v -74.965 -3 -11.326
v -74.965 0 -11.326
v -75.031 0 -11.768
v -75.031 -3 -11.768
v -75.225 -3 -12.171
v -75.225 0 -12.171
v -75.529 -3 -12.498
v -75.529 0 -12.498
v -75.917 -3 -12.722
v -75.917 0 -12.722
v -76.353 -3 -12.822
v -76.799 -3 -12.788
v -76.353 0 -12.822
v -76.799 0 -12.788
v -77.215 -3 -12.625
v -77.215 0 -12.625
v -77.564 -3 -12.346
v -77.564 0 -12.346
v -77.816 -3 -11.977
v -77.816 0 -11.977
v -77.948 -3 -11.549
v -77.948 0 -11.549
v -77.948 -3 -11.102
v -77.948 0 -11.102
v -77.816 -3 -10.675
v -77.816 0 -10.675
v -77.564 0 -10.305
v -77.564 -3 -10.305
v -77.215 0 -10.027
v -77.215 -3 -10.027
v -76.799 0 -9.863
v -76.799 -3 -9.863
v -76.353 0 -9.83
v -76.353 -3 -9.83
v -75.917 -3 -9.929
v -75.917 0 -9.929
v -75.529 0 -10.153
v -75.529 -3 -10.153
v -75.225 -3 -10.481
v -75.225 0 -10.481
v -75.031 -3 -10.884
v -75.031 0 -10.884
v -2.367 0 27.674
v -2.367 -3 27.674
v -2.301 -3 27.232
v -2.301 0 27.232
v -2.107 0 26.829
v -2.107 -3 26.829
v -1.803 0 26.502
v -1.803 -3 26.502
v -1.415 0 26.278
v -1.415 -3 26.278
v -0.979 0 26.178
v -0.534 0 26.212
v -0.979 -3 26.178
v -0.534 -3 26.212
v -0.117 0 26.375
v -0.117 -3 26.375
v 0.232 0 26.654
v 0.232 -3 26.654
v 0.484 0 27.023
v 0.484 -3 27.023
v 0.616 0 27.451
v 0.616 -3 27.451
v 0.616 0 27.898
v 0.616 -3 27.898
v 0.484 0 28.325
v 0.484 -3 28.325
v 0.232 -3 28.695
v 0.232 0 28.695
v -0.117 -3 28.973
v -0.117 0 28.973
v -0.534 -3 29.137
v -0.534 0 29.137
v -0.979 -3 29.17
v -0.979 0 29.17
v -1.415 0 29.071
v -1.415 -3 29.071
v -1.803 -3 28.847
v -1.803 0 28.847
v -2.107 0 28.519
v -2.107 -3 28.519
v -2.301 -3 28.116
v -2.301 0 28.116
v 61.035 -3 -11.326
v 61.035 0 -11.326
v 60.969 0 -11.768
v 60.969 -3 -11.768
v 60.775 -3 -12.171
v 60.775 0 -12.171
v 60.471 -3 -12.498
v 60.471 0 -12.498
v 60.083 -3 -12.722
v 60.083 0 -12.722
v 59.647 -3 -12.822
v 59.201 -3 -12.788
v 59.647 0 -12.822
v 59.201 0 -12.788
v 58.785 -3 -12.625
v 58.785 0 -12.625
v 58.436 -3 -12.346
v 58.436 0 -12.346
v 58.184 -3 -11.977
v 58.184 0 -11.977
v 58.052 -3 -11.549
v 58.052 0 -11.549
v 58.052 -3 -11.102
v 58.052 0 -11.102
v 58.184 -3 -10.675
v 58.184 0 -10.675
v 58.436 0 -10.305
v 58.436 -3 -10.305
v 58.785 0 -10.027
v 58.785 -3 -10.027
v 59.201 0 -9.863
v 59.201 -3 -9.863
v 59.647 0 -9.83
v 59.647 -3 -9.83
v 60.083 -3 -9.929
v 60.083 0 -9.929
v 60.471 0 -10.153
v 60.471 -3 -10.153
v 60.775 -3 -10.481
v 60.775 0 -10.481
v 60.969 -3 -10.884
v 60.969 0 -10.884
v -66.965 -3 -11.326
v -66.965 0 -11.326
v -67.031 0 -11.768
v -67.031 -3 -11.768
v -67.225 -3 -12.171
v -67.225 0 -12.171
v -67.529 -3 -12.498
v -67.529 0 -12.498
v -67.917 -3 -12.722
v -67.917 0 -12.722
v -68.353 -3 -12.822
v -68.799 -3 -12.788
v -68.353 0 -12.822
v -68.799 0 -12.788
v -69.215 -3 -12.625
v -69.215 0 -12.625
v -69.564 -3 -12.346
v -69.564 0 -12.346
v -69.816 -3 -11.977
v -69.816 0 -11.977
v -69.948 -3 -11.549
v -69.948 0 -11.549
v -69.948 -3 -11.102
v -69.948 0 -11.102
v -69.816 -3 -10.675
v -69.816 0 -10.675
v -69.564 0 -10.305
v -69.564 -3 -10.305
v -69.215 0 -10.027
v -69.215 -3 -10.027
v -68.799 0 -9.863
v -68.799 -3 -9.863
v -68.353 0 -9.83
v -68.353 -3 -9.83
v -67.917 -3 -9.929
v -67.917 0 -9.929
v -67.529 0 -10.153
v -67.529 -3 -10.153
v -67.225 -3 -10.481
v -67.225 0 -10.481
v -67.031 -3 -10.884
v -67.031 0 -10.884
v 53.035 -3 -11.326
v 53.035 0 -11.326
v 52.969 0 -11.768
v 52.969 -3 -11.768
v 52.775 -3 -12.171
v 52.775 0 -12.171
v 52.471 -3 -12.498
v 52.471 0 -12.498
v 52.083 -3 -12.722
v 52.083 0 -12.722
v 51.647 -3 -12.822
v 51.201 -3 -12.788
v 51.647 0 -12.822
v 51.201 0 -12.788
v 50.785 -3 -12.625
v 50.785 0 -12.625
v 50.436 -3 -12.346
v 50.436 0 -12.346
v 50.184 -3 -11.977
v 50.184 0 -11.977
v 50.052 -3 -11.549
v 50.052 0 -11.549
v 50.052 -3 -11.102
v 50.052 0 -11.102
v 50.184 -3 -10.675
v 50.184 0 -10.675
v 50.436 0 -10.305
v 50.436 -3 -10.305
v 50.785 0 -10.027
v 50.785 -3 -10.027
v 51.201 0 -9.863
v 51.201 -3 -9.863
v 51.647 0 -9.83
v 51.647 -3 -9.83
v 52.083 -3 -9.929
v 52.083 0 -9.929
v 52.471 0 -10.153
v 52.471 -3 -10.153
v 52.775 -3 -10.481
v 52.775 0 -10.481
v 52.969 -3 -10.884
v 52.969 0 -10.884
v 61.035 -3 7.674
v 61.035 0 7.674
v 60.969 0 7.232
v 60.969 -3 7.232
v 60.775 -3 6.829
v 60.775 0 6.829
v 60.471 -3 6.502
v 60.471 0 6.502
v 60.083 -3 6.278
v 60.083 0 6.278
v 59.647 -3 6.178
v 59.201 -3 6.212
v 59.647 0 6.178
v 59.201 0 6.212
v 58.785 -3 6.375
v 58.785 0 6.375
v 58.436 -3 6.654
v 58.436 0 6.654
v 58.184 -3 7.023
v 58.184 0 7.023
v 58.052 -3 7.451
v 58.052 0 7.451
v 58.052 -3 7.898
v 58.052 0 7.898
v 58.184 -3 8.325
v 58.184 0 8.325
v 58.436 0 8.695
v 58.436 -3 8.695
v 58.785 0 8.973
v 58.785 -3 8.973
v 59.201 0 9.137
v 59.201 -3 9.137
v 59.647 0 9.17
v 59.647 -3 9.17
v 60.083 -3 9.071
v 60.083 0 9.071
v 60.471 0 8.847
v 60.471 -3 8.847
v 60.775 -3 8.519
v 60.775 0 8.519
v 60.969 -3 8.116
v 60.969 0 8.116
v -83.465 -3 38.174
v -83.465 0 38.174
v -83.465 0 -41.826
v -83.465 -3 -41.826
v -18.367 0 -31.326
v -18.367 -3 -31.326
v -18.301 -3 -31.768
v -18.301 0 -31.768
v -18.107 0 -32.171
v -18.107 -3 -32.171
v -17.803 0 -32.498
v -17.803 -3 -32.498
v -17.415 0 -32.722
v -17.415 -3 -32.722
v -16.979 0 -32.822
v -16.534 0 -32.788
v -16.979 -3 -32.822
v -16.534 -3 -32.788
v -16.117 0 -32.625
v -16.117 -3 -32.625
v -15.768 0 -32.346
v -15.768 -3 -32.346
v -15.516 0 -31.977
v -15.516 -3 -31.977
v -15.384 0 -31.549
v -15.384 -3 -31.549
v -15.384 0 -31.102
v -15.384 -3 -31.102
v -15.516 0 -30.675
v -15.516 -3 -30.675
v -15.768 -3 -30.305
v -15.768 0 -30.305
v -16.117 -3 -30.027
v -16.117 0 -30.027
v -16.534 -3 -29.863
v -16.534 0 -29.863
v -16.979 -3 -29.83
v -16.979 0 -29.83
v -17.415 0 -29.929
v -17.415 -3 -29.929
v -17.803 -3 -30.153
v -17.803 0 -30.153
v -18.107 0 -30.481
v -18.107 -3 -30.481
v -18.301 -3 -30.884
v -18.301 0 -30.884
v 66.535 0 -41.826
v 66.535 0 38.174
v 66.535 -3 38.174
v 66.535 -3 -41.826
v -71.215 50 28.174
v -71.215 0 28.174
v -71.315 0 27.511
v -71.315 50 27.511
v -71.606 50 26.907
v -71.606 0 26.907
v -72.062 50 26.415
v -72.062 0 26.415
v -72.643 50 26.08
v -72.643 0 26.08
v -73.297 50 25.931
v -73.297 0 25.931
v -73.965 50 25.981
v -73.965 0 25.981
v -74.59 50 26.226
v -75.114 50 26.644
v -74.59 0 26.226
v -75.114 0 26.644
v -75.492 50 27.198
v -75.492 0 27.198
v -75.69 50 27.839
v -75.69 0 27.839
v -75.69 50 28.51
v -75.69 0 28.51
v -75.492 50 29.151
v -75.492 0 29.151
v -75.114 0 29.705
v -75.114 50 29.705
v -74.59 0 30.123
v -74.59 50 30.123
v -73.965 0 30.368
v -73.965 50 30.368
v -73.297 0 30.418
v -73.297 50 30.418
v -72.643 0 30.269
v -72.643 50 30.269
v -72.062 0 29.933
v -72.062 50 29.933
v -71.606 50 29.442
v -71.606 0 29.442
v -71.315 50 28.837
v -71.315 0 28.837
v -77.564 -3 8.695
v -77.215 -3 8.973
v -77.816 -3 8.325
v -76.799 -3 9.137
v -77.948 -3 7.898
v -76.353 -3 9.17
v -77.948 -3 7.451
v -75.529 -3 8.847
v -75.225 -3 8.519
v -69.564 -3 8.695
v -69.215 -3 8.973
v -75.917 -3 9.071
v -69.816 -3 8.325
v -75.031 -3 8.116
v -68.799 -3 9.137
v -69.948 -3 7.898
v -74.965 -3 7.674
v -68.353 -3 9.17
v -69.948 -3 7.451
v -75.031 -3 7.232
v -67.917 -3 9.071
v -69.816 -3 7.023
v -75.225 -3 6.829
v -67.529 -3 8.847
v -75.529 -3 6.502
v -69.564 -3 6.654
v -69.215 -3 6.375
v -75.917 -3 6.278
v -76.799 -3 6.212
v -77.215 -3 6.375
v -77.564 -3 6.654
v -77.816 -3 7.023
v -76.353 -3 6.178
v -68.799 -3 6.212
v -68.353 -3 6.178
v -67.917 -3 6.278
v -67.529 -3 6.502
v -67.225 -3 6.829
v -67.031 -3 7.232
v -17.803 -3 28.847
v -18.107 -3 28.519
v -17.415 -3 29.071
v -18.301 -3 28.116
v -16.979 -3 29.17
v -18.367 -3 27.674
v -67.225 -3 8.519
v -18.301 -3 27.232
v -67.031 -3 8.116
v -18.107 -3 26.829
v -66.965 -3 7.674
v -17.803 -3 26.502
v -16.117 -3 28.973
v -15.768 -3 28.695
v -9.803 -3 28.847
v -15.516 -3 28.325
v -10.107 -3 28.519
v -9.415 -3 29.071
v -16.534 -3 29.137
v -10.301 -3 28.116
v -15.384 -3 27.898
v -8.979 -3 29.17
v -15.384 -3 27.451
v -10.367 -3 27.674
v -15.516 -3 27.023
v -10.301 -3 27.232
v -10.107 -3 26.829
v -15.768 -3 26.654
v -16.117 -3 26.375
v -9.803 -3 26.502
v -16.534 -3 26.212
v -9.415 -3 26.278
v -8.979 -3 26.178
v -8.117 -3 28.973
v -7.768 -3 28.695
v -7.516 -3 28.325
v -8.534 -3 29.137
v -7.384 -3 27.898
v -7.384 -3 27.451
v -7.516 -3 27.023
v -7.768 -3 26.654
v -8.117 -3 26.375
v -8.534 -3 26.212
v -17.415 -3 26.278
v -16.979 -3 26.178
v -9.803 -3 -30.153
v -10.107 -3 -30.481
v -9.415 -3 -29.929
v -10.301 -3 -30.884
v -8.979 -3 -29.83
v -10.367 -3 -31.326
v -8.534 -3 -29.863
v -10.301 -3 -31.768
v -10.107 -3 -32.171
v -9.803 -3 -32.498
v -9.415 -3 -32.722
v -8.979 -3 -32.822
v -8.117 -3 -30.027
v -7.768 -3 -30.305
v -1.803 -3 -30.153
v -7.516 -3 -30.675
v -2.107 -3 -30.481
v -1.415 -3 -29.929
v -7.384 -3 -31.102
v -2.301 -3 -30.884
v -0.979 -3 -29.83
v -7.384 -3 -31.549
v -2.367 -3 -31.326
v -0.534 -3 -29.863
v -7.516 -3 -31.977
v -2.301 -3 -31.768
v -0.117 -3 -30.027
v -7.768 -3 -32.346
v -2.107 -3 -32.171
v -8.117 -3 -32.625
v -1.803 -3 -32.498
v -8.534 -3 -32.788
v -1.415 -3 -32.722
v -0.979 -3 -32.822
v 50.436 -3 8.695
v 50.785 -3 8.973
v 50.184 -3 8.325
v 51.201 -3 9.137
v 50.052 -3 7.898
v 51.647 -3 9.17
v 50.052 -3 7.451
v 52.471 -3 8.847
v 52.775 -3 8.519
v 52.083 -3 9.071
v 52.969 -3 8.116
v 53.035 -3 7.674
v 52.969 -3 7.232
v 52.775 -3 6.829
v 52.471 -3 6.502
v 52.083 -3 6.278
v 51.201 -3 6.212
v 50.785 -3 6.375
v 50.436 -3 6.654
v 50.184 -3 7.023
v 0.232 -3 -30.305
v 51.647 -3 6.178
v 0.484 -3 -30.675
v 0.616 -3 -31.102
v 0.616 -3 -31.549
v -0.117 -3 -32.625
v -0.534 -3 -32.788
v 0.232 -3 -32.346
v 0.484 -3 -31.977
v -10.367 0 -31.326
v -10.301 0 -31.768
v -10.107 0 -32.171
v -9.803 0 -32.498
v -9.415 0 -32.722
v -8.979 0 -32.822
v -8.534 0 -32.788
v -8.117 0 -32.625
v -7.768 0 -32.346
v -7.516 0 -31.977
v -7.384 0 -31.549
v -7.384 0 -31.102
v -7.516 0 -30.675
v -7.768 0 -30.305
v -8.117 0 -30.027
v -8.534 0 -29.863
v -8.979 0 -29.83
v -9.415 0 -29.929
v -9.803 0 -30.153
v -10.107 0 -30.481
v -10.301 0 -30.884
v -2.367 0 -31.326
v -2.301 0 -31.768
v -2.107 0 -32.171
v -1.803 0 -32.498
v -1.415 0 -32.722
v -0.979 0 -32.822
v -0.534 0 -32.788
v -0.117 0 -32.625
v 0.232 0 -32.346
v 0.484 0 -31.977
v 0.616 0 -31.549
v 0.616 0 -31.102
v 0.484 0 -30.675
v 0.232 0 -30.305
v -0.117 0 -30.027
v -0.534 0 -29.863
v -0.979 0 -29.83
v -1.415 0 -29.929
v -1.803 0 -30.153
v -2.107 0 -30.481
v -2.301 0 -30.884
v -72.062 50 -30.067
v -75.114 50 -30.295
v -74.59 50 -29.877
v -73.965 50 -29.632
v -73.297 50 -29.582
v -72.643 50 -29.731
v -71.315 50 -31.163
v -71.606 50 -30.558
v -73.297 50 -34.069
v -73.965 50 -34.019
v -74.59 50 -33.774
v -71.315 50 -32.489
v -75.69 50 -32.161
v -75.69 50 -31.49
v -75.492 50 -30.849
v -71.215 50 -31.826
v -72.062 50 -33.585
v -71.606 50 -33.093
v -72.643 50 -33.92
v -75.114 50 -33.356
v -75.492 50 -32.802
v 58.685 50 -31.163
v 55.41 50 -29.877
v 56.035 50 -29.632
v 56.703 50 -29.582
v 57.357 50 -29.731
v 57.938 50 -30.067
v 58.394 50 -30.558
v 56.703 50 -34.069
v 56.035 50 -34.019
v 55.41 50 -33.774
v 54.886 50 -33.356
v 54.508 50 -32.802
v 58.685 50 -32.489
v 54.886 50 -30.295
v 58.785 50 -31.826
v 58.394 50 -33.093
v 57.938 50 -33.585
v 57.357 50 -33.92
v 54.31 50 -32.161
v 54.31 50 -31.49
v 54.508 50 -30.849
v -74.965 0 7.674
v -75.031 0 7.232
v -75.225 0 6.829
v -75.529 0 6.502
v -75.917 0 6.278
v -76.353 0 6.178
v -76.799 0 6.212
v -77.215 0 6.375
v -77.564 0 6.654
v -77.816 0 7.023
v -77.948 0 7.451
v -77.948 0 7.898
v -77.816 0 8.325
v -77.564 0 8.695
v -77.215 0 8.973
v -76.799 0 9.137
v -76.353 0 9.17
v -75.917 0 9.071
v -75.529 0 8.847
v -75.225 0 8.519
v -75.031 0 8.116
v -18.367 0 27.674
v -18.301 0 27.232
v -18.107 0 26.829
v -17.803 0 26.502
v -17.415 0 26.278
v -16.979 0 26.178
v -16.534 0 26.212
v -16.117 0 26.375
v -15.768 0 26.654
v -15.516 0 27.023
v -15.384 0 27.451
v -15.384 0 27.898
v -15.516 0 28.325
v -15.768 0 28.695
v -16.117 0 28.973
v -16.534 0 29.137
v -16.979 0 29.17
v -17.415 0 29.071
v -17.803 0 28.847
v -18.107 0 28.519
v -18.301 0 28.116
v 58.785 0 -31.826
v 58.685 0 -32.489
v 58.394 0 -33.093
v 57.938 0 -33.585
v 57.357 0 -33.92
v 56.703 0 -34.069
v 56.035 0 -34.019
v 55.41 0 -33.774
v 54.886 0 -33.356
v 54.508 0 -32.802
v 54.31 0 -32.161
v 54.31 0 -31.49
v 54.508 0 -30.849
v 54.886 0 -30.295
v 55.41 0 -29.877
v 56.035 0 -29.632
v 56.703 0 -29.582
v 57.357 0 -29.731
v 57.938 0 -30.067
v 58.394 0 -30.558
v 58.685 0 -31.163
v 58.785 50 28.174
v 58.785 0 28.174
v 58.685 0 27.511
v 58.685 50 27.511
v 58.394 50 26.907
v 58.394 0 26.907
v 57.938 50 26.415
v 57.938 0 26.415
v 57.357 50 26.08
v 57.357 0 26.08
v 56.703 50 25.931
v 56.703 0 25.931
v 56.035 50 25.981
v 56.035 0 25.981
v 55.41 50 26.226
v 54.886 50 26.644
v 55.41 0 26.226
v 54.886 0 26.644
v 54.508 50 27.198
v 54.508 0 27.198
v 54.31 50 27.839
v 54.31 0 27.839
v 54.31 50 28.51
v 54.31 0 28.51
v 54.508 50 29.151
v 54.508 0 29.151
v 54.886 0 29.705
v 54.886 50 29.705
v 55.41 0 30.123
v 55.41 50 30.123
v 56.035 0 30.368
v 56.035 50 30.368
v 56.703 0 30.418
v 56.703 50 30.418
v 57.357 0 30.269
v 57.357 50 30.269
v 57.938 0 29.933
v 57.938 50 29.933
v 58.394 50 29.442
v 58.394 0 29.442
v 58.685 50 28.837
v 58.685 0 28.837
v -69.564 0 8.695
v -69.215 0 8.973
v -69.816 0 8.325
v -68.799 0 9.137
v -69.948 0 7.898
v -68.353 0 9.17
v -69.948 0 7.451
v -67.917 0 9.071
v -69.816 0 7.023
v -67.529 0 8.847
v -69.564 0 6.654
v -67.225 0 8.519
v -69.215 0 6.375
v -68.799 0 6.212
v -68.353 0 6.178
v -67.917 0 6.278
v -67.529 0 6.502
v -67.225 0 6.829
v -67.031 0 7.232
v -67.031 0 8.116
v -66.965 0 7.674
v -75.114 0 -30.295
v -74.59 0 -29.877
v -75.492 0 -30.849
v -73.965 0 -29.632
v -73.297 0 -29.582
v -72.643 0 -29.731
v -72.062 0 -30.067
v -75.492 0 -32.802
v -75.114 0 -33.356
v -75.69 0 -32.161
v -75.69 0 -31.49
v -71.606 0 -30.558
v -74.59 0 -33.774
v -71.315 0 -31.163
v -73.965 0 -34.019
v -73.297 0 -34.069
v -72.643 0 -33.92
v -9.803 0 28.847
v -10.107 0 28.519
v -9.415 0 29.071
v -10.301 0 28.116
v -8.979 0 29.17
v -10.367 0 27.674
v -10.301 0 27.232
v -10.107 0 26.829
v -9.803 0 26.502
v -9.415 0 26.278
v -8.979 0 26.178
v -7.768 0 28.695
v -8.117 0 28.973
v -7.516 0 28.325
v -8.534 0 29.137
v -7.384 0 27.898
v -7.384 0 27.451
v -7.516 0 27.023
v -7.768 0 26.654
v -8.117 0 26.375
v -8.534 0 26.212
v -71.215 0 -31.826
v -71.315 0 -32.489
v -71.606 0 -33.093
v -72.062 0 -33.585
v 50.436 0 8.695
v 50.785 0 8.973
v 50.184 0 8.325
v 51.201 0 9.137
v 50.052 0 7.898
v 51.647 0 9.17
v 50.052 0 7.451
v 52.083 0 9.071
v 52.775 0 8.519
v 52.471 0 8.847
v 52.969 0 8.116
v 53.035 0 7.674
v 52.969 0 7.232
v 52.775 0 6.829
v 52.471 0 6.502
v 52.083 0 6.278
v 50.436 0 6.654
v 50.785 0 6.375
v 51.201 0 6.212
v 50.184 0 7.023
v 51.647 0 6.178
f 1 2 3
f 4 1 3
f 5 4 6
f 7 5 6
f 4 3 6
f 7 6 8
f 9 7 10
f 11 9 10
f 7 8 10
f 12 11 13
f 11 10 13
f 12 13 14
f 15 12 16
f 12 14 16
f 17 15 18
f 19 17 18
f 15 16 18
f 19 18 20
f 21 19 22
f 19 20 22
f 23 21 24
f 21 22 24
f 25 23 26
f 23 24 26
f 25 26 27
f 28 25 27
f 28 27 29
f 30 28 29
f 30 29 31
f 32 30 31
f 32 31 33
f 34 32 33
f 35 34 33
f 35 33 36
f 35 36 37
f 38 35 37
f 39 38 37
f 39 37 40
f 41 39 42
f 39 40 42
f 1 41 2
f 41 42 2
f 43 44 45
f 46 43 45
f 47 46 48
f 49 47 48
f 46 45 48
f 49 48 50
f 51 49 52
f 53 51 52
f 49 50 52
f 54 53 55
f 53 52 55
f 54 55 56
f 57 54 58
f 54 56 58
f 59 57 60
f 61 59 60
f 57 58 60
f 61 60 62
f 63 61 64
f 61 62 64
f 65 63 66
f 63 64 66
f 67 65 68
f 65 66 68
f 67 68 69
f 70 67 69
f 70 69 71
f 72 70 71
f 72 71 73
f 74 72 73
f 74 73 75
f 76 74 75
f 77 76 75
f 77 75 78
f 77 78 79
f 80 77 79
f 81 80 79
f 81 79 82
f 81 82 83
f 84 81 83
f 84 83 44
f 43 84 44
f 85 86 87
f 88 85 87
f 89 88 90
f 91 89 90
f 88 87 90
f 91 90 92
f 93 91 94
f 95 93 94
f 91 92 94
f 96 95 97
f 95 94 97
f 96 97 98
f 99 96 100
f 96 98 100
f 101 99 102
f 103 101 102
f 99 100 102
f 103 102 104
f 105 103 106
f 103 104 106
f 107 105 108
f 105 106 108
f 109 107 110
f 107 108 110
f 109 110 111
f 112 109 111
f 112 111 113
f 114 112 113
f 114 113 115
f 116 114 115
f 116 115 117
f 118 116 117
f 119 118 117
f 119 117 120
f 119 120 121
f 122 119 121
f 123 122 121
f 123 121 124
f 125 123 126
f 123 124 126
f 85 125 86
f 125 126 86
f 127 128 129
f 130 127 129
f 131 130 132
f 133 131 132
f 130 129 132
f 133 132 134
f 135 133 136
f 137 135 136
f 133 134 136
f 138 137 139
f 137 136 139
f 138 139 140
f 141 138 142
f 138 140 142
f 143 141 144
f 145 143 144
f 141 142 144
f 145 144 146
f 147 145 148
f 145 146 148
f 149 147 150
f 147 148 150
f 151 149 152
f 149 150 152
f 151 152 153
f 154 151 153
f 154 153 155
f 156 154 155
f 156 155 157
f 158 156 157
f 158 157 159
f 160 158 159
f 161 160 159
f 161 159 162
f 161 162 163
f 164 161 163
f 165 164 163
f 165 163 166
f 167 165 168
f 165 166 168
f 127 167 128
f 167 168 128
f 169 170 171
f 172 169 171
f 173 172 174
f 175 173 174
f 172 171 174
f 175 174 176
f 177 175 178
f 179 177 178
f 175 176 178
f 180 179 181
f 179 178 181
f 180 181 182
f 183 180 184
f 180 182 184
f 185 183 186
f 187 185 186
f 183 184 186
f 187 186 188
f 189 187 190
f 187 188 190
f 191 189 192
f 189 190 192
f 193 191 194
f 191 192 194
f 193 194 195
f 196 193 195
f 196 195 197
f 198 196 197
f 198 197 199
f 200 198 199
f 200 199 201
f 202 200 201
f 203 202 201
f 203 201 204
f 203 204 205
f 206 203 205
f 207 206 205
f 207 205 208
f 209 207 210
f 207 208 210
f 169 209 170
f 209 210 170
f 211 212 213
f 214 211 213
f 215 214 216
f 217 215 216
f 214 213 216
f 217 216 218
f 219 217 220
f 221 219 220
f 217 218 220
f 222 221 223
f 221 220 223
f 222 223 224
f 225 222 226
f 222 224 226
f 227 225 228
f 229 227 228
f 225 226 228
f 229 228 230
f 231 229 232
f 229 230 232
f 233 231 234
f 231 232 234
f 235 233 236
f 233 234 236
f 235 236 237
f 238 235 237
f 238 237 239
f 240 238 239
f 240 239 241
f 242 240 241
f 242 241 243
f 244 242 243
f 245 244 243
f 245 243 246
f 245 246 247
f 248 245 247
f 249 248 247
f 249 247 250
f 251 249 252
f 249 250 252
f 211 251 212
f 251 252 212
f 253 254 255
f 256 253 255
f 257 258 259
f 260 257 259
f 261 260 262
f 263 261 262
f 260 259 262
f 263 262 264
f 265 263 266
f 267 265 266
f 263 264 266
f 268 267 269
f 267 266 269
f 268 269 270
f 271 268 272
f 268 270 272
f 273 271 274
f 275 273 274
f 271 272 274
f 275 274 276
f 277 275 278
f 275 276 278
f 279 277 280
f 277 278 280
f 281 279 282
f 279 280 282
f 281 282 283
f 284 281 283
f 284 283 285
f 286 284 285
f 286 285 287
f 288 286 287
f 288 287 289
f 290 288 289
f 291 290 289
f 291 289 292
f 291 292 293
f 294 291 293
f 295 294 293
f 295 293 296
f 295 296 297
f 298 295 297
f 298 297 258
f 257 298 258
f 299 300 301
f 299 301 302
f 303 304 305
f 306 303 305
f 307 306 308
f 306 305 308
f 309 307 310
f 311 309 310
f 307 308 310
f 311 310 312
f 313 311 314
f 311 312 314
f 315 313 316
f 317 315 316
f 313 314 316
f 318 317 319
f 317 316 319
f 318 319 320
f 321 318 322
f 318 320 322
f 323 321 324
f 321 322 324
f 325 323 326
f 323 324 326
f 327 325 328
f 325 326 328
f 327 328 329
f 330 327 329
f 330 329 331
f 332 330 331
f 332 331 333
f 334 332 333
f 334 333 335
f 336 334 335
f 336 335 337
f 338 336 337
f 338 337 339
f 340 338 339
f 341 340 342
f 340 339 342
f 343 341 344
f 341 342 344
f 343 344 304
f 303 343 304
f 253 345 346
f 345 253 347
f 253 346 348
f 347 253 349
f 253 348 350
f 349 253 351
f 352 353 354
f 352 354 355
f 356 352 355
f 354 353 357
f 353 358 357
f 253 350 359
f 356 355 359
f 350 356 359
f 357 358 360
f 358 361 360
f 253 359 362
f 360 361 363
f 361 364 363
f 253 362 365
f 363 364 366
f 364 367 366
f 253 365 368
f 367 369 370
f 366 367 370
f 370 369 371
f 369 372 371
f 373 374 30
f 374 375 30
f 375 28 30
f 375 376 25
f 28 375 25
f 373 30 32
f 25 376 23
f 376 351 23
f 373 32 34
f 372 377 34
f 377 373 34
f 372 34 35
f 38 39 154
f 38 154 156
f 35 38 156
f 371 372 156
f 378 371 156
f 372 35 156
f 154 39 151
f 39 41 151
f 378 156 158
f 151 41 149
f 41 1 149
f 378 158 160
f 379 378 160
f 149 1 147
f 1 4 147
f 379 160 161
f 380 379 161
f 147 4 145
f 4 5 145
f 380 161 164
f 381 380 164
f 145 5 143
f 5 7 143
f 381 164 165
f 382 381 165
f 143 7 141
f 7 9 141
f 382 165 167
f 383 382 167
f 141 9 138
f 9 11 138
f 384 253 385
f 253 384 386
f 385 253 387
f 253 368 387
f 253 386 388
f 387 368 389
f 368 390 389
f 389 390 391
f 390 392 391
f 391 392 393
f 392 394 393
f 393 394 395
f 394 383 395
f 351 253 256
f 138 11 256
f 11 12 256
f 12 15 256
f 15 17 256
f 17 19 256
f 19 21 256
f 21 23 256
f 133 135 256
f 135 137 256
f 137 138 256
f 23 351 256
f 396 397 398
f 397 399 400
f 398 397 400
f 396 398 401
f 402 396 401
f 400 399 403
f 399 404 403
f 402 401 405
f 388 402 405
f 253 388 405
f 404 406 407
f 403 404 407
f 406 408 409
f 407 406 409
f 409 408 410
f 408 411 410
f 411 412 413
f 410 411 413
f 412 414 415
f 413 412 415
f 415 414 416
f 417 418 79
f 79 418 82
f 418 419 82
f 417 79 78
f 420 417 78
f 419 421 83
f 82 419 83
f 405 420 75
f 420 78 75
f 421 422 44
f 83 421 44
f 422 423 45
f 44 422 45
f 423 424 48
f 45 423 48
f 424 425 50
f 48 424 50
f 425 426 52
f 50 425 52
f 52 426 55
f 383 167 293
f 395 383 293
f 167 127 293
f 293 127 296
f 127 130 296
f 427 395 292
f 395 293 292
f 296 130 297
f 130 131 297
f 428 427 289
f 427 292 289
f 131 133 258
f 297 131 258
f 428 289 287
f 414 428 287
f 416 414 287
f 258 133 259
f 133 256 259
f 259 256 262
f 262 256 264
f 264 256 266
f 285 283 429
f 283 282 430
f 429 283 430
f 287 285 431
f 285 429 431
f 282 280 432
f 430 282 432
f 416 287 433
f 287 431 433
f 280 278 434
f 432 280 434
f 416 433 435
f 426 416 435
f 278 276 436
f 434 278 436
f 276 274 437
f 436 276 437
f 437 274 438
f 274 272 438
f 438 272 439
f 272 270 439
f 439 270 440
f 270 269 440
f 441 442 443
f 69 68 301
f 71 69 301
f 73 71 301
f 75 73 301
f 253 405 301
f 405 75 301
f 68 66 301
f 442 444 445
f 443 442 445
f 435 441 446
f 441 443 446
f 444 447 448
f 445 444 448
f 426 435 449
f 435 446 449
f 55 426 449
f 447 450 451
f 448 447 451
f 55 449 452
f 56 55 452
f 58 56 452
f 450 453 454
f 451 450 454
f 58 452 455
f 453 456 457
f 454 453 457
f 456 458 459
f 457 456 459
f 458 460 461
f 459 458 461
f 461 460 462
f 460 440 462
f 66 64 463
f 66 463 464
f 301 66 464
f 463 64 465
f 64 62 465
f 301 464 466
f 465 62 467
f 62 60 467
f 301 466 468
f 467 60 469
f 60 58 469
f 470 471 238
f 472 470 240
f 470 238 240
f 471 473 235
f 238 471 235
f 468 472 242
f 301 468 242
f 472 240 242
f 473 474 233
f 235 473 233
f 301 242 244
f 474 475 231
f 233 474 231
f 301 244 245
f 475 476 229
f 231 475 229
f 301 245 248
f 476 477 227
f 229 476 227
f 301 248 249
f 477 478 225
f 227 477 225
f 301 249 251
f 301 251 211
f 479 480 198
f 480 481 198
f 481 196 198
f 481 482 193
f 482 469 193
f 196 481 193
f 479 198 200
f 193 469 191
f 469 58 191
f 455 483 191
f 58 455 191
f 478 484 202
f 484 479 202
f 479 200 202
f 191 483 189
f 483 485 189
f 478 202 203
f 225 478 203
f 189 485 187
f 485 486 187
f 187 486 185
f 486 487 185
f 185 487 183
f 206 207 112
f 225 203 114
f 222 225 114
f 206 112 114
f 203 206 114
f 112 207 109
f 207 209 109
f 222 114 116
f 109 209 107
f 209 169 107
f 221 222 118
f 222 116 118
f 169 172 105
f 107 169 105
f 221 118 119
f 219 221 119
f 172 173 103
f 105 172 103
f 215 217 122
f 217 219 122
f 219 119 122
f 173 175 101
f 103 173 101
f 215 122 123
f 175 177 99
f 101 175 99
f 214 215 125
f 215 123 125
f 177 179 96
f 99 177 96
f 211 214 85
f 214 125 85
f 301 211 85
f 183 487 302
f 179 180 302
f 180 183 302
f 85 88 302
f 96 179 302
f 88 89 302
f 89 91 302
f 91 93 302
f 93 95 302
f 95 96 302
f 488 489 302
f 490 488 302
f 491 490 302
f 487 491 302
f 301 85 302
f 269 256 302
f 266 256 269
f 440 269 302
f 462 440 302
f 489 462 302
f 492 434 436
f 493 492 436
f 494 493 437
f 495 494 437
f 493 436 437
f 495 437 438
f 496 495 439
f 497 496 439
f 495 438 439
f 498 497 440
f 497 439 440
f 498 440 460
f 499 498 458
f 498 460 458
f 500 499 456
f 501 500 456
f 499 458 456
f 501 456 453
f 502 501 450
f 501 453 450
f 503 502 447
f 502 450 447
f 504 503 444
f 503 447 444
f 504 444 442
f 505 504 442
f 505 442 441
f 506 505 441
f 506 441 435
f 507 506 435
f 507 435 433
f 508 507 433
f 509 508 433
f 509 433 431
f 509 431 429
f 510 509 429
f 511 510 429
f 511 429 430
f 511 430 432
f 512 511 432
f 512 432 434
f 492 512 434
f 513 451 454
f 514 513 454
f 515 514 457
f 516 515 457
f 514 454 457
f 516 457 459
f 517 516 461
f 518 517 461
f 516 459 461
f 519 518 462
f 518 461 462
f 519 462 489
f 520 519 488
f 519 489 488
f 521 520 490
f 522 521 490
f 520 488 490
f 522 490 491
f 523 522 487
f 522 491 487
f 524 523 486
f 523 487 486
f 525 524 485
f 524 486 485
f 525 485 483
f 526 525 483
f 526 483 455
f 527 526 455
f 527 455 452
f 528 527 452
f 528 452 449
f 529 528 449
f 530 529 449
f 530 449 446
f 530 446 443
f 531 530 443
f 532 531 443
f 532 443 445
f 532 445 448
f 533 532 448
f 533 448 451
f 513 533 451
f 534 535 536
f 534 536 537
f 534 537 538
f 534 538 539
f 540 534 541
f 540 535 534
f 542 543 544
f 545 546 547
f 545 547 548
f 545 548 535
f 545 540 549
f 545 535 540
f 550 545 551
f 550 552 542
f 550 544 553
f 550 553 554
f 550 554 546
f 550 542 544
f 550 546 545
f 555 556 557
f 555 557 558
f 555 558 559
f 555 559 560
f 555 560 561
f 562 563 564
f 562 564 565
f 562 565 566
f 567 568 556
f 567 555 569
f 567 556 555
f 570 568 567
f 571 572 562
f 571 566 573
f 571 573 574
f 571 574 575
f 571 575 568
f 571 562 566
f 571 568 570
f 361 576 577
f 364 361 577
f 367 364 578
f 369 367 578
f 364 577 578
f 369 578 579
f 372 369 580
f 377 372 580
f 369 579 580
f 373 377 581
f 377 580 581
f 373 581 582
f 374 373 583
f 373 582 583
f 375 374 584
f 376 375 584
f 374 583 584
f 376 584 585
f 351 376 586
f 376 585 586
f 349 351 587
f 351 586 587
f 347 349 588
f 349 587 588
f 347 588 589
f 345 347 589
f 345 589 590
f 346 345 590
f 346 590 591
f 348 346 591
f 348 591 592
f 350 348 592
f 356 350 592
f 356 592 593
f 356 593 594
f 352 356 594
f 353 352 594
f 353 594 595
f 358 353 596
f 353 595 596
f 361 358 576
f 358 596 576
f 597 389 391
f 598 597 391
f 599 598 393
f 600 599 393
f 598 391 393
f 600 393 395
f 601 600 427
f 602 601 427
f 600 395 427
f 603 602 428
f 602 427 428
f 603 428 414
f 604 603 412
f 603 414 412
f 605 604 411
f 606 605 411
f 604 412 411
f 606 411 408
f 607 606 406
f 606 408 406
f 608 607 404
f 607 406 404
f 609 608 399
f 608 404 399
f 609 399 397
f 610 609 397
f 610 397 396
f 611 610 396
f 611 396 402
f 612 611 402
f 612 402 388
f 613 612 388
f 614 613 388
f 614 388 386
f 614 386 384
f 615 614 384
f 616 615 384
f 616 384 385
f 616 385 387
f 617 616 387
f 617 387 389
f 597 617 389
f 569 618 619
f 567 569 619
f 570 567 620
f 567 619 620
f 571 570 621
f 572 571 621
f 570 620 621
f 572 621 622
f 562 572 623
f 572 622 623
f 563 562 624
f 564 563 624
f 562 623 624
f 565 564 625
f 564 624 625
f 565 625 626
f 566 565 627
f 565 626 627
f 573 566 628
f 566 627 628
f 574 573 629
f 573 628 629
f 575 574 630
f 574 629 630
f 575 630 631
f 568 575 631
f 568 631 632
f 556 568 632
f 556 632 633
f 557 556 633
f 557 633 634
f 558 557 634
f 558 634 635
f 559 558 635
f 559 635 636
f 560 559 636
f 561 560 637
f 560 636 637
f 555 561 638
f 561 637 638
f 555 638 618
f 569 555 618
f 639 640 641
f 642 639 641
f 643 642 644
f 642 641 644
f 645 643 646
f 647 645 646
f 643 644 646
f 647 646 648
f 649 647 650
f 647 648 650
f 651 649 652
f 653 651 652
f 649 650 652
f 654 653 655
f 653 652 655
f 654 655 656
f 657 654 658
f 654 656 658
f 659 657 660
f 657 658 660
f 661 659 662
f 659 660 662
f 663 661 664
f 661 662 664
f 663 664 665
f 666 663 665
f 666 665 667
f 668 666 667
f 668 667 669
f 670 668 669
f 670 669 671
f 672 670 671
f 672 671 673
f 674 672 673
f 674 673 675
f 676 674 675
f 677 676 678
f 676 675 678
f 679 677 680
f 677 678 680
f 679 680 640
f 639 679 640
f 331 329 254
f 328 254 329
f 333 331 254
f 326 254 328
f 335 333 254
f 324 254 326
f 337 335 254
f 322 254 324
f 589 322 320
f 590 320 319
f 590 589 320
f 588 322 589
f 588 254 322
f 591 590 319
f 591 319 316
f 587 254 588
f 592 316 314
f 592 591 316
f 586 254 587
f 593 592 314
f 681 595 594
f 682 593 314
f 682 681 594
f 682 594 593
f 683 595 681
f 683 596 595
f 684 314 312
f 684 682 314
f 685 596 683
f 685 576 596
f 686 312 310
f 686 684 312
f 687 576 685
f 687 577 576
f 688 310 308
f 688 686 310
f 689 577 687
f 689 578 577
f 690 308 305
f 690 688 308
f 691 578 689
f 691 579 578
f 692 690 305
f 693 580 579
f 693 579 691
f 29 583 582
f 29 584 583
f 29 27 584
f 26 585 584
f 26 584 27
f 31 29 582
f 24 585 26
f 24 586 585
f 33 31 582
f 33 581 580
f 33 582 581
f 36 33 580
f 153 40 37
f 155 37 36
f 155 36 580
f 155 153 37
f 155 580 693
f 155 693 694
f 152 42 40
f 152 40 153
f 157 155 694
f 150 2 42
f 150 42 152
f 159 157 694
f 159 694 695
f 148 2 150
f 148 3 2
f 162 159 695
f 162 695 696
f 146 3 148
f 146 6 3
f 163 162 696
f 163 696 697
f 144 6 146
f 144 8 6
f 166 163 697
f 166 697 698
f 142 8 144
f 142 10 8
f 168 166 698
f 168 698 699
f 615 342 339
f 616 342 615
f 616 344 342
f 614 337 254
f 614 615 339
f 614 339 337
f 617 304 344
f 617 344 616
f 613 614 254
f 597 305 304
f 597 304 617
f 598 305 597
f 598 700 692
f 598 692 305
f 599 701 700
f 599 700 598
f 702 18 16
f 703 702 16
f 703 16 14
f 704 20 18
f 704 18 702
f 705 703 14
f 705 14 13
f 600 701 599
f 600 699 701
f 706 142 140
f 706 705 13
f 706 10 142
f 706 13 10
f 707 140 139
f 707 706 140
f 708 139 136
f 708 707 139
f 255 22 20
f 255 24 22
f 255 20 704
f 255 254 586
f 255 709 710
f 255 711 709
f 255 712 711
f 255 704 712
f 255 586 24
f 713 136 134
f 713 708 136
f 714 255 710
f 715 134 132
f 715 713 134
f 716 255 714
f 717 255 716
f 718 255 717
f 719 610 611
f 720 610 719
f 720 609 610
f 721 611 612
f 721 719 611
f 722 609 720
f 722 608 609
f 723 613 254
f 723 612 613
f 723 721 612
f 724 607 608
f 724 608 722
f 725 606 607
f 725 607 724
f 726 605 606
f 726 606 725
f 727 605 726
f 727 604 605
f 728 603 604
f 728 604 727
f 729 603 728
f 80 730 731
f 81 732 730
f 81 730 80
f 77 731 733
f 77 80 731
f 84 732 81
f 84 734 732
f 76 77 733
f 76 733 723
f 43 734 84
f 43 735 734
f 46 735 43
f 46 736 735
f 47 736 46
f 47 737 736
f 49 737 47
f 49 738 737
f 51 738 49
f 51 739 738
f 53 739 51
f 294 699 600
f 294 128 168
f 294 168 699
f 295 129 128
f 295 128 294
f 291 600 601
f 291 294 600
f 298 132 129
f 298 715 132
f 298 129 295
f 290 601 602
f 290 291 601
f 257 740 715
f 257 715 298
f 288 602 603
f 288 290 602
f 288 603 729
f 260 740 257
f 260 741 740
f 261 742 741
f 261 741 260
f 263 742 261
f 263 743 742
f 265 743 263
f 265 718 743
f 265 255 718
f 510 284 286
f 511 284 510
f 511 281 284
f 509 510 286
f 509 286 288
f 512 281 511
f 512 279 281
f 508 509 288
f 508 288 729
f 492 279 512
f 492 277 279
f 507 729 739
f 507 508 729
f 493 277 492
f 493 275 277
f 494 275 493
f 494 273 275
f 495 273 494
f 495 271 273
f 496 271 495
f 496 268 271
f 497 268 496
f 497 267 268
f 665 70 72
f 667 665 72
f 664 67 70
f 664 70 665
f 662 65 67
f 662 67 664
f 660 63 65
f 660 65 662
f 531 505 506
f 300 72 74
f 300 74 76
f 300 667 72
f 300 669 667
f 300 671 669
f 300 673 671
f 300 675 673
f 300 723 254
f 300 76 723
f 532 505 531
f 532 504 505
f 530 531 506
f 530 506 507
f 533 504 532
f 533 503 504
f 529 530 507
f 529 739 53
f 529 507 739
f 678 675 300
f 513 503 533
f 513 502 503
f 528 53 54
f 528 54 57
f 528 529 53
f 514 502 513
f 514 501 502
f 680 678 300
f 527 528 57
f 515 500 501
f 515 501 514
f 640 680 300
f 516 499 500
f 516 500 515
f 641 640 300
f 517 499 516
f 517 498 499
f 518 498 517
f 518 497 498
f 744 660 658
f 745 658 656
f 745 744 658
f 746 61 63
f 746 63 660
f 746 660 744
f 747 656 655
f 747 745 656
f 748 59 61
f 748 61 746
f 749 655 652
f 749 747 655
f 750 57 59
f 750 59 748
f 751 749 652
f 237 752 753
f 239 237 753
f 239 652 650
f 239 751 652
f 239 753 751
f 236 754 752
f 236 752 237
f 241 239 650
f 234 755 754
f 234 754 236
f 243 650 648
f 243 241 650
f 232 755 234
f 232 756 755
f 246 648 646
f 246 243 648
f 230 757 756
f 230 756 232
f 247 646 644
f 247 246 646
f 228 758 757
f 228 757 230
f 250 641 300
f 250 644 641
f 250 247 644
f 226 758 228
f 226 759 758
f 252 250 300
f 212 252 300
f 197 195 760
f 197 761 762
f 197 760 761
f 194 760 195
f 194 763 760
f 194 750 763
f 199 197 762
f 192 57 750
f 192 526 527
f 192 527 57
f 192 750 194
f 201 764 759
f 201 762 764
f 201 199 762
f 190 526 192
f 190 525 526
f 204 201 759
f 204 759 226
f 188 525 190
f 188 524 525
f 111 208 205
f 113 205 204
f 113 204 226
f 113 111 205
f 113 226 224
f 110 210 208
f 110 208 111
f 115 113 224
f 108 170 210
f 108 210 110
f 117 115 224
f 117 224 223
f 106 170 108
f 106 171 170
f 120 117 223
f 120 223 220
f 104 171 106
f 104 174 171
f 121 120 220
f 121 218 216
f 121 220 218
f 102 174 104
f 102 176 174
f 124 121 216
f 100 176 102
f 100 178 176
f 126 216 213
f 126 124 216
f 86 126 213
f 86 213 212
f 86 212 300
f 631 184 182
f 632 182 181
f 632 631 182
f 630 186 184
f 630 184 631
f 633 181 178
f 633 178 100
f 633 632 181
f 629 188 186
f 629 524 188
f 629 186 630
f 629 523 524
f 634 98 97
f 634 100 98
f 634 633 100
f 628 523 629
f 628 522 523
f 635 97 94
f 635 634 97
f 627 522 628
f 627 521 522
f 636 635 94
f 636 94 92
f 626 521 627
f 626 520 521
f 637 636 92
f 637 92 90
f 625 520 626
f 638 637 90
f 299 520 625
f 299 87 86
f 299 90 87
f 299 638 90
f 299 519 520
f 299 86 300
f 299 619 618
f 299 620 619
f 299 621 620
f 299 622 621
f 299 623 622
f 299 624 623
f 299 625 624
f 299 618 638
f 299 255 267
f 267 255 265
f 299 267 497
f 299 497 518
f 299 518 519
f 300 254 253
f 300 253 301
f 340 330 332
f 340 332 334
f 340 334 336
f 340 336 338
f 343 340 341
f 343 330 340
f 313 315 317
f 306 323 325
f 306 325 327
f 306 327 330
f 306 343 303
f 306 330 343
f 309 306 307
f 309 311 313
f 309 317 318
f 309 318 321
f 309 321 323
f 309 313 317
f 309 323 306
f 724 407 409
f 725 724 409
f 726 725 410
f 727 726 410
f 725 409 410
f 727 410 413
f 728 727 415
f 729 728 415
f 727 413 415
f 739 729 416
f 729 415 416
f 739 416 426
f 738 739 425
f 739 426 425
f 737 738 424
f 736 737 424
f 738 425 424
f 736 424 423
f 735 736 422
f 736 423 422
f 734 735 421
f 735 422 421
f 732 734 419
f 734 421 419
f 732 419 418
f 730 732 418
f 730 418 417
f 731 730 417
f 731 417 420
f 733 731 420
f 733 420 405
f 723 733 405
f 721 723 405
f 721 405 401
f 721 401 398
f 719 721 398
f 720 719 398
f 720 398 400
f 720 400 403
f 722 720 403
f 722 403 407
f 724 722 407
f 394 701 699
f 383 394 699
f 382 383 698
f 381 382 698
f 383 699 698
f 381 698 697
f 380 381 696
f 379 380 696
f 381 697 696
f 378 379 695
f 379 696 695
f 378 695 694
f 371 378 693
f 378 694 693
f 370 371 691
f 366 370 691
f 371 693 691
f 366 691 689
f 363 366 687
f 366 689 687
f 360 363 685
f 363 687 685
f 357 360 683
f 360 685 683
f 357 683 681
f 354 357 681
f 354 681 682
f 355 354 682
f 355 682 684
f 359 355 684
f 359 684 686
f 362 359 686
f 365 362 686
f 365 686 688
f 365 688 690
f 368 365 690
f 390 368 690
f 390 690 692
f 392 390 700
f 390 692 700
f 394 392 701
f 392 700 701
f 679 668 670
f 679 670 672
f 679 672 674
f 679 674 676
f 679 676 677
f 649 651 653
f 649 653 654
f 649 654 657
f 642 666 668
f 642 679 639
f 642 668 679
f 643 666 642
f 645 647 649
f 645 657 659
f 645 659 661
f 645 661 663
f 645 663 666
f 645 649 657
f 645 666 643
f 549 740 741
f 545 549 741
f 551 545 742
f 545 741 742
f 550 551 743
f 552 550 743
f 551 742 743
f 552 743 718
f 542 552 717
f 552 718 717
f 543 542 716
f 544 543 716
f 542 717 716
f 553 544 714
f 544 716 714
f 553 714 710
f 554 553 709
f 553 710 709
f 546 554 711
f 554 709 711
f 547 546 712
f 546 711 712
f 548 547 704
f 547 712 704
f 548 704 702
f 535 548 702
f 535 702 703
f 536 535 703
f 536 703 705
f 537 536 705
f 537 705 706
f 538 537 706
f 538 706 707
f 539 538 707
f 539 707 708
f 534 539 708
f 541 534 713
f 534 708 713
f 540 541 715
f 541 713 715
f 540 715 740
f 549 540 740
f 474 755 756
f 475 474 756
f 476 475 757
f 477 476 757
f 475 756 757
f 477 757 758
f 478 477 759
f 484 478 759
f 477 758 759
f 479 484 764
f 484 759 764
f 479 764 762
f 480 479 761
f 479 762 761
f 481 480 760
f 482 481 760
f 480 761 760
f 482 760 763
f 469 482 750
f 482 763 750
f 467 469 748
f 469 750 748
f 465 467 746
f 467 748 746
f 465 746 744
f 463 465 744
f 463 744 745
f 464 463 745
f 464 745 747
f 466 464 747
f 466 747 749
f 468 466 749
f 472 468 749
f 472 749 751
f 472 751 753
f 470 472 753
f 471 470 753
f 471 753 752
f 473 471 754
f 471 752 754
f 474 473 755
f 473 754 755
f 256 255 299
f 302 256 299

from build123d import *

# Parameters (mm, degrees)
SKETCH2_W           = 150
SKETCH2_H           = 80
SKETCH2_R           = 1.5
BOSS_EXTRUDE1_DEPTH = 3
SKETCH3_R           = 2.25
BOSS_EXTRUDE2_DEPTH = 50
SKETCH4_R           = 1.5
CUT_EXTRUDE1_DEPTH  = 10


with BuildPart() as part:
    # Sketch2 → Boss-Extrude1 (new body)
    with BuildSketch(Plane(origin=(0, 0, 0), x_dir=(1, 0, 0), z_dir=(0, 1, 0))):
        with Locations((-8.46473029, 1.825726141)):
            Rectangle(SKETCH2_W, SKETCH2_H)
        with Locations((-68.46473029, 11.325726141)):
            Circle(SKETCH2_R, mode=Mode.SUBTRACT)
        with Locations((-68.46473029, -7.674273859)):
            Circle(SKETCH2_R, mode=Mode.SUBTRACT)
        with Locations((-76.46473029, 11.325726141)):
            Circle(SKETCH2_R, mode=Mode.SUBTRACT)
        with Locations((-76.46473029, -7.674273859)):
            Circle(SKETCH2_R, mode=Mode.SUBTRACT)
        with Locations((51.53526971, -7.674273859)):
            Circle(SKETCH2_R, mode=Mode.SUBTRACT)
        with Locations((59.53526971, -7.674273859)):
            Circle(SKETCH2_R, mode=Mode.SUBTRACT)
        with Locations((59.53526971, 11.325726141)):
            Circle(SKETCH2_R, mode=Mode.SUBTRACT)
        with Locations((51.53526971, 11.325726141)):
            Circle(SKETCH2_R, mode=Mode.SUBTRACT)
    extrude(amount=-BOSS_EXTRUDE1_DEPTH)

    # Sketch3 → Boss-Extrude2 (add)
    with BuildSketch(Plane(origin=(0, 0, 0), x_dir=(1, 0, 0), z_dir=(0, 1, 0))):
        with Locations((56.53526971, 31.825726141)):
            Circle(SKETCH3_R)
        with Locations((56.53526971, -28.174273859)):
            Circle(SKETCH3_R)
        with Locations((-73.46473029, -28.174273859)):
            Circle(SKETCH3_R)
        with Locations((-73.46473029, 31.825726141)):
            Circle(SKETCH3_R)
    extrude(amount=BOSS_EXTRUDE2_DEPTH)

    # Sketch4 → Cut-Extrude1 (cut)
    with BuildSketch(Plane(origin=(0, -3, 0), x_dir=(-1, 0, 0), z_dir=(0, -1, 0))):
        with Locations((16.867382004, 31.325726141)):
            Circle(SKETCH4_R)
        with Locations((8.867382004, 31.325726141)):
            Circle(SKETCH4_R)
        with Locations((0.867382004, 31.325726141)):
            Circle(SKETCH4_R)
        with Locations((16.867382004, -27.674273859)):
            Circle(SKETCH4_R)
        with Locations((8.867382004, -27.674273859)):
            Circle(SKETCH4_R)
        with Locations((0.867382004, -27.674273859)):
            Circle(SKETCH4_R)
    extrude(amount=-CUT_EXTRUDE1_DEPTH, mode=Mode.SUBTRACT)


solid = part.part
